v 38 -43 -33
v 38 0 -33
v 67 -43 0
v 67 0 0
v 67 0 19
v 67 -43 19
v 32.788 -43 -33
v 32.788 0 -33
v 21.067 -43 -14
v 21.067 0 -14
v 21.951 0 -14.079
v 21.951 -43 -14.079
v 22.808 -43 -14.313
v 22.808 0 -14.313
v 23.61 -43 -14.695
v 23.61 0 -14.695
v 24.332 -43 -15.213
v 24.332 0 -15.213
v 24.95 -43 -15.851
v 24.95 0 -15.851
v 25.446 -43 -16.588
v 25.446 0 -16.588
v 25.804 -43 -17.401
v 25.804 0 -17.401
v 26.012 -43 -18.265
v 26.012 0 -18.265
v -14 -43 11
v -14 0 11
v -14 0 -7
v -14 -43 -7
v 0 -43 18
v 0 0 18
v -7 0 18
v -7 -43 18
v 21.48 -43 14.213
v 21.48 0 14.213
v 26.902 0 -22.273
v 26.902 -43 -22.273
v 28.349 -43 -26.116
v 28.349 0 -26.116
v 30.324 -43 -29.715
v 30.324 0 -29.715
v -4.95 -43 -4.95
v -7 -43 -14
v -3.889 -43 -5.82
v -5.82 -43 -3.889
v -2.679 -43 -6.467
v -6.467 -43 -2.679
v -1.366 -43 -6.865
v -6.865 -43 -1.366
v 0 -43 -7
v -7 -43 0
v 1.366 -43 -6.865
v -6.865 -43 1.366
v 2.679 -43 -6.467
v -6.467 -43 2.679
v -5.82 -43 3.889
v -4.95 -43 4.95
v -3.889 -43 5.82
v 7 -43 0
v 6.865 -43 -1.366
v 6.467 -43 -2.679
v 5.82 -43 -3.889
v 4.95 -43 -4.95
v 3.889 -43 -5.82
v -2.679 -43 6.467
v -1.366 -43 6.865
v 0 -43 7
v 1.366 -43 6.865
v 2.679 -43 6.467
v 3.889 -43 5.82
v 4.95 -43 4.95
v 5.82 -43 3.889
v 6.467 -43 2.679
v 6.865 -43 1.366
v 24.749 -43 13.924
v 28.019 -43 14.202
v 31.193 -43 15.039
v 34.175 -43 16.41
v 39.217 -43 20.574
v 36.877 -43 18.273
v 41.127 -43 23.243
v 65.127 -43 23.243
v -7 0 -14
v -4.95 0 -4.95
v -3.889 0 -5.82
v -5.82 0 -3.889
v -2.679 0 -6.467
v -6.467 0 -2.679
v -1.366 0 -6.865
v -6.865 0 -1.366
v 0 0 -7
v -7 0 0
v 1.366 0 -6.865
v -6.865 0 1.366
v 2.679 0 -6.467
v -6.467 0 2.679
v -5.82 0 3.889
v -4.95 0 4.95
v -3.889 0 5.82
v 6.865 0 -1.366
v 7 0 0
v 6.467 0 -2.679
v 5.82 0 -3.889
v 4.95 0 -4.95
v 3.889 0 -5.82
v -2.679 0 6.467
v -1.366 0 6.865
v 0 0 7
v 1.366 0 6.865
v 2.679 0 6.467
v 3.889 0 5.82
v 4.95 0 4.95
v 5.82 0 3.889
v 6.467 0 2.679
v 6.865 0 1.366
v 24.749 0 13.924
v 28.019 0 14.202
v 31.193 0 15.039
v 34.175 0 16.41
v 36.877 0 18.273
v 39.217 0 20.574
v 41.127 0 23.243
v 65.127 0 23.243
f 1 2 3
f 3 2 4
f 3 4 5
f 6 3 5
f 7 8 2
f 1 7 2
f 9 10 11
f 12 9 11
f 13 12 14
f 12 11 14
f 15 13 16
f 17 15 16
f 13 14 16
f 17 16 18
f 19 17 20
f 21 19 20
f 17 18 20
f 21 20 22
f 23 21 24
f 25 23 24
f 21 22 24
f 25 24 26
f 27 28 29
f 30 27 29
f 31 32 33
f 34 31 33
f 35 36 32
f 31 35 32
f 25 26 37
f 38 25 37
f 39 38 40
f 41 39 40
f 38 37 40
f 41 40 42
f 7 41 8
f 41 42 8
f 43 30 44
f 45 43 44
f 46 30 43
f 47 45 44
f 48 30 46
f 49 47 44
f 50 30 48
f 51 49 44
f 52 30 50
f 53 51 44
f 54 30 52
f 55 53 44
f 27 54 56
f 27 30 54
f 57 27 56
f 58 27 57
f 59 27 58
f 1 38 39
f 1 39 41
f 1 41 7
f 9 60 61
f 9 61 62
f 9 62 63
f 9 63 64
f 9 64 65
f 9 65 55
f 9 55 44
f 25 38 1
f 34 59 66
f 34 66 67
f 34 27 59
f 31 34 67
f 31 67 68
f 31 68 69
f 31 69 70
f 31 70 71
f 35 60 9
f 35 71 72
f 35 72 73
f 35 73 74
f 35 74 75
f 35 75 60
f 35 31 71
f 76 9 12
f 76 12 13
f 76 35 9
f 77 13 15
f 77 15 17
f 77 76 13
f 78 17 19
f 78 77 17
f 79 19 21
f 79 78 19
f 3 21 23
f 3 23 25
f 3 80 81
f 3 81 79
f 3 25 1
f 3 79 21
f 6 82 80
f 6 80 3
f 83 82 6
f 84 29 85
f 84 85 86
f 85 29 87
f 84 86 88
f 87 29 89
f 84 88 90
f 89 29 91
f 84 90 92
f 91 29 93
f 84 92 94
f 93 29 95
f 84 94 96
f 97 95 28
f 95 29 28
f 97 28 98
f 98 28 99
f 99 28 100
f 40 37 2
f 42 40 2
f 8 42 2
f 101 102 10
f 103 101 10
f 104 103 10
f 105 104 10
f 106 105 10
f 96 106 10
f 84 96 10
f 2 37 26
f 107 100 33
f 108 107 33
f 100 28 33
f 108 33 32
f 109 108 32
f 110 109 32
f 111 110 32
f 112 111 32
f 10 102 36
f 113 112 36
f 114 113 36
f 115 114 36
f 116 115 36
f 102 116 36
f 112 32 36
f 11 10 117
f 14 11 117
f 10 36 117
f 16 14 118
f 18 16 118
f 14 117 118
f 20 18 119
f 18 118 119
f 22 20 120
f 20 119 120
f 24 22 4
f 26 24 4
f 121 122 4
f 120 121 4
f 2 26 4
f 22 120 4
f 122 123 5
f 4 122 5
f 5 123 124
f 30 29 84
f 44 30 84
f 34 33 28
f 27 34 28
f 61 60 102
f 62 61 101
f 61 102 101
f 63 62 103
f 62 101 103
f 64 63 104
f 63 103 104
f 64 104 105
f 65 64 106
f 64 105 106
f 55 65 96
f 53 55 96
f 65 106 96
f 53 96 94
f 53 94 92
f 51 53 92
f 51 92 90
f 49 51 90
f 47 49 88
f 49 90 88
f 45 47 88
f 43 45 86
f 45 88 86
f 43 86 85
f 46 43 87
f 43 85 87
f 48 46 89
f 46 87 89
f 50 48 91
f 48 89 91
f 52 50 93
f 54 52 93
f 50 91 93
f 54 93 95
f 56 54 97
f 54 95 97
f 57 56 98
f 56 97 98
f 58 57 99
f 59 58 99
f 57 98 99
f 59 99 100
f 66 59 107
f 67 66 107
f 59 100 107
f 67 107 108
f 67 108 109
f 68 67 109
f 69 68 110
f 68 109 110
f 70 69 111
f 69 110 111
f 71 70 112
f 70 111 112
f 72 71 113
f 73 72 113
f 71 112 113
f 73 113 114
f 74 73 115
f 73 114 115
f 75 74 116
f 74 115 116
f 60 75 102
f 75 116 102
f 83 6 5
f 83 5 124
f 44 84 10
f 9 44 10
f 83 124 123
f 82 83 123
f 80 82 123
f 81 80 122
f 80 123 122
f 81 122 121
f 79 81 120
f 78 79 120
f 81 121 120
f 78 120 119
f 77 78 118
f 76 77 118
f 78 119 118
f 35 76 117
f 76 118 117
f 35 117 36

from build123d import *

# Parameters (mm, degrees)
F1_DEPTH = 43


with BuildPart() as f1:
    # F0 (on Front) → F1 (new body)
    with BuildSketch(Plane.XZ):
        with BuildLine():
            ThreePointArc((-7, 0), (0, -7), (7, 0))
            ThreePointArc((7, 0), (0, 7), (-7, 0))
        make_face()
        with BuildLine():
            Line((-14, 11), (-14, 0))
            Line((-14, 0), (-14, -7))
            Line((-14, -7), (-7, -14))
            Line((-7, -14), (0, -14))
            Line((0, -14), (21.066626, -14))
            ThreePointArc((21.066626, -14), (24.331862, -15.213414), (26.012265, -18.264706))
            ThreePointArc((26.012265, -18.264706), (28.349095, -26.115672), (32.788067, -33))
            Line((32.788067, -33), (38, -33))
            Line((38, -33), (67, 0))
            Line((67, 0), (67, 19))
            Line((67, 19), (65.127473, 23.242816))
            Line((65.127473, 23.242816), (41.127473, 23.242816))
            ThreePointArc((41.127473, 23.242816), (32.713444, 15.660003), (21.479572, 14.212572))
            Line((21.479572, 14.212572), (0, 18))
            Line((0, 18), (-7, 18))
            Line((-7, 18), (-14, 11))
        make_face()
        with BuildLine():
            ThreePointArc((-7, 0), (0, 7), (7, 0))
            ThreePointArc((7, 0), (0, -7), (-7, 0))
        make_face(mode=Mode.SUBTRACT)
    extrude(amount=F1_DEPTH)


solid = f1.part
